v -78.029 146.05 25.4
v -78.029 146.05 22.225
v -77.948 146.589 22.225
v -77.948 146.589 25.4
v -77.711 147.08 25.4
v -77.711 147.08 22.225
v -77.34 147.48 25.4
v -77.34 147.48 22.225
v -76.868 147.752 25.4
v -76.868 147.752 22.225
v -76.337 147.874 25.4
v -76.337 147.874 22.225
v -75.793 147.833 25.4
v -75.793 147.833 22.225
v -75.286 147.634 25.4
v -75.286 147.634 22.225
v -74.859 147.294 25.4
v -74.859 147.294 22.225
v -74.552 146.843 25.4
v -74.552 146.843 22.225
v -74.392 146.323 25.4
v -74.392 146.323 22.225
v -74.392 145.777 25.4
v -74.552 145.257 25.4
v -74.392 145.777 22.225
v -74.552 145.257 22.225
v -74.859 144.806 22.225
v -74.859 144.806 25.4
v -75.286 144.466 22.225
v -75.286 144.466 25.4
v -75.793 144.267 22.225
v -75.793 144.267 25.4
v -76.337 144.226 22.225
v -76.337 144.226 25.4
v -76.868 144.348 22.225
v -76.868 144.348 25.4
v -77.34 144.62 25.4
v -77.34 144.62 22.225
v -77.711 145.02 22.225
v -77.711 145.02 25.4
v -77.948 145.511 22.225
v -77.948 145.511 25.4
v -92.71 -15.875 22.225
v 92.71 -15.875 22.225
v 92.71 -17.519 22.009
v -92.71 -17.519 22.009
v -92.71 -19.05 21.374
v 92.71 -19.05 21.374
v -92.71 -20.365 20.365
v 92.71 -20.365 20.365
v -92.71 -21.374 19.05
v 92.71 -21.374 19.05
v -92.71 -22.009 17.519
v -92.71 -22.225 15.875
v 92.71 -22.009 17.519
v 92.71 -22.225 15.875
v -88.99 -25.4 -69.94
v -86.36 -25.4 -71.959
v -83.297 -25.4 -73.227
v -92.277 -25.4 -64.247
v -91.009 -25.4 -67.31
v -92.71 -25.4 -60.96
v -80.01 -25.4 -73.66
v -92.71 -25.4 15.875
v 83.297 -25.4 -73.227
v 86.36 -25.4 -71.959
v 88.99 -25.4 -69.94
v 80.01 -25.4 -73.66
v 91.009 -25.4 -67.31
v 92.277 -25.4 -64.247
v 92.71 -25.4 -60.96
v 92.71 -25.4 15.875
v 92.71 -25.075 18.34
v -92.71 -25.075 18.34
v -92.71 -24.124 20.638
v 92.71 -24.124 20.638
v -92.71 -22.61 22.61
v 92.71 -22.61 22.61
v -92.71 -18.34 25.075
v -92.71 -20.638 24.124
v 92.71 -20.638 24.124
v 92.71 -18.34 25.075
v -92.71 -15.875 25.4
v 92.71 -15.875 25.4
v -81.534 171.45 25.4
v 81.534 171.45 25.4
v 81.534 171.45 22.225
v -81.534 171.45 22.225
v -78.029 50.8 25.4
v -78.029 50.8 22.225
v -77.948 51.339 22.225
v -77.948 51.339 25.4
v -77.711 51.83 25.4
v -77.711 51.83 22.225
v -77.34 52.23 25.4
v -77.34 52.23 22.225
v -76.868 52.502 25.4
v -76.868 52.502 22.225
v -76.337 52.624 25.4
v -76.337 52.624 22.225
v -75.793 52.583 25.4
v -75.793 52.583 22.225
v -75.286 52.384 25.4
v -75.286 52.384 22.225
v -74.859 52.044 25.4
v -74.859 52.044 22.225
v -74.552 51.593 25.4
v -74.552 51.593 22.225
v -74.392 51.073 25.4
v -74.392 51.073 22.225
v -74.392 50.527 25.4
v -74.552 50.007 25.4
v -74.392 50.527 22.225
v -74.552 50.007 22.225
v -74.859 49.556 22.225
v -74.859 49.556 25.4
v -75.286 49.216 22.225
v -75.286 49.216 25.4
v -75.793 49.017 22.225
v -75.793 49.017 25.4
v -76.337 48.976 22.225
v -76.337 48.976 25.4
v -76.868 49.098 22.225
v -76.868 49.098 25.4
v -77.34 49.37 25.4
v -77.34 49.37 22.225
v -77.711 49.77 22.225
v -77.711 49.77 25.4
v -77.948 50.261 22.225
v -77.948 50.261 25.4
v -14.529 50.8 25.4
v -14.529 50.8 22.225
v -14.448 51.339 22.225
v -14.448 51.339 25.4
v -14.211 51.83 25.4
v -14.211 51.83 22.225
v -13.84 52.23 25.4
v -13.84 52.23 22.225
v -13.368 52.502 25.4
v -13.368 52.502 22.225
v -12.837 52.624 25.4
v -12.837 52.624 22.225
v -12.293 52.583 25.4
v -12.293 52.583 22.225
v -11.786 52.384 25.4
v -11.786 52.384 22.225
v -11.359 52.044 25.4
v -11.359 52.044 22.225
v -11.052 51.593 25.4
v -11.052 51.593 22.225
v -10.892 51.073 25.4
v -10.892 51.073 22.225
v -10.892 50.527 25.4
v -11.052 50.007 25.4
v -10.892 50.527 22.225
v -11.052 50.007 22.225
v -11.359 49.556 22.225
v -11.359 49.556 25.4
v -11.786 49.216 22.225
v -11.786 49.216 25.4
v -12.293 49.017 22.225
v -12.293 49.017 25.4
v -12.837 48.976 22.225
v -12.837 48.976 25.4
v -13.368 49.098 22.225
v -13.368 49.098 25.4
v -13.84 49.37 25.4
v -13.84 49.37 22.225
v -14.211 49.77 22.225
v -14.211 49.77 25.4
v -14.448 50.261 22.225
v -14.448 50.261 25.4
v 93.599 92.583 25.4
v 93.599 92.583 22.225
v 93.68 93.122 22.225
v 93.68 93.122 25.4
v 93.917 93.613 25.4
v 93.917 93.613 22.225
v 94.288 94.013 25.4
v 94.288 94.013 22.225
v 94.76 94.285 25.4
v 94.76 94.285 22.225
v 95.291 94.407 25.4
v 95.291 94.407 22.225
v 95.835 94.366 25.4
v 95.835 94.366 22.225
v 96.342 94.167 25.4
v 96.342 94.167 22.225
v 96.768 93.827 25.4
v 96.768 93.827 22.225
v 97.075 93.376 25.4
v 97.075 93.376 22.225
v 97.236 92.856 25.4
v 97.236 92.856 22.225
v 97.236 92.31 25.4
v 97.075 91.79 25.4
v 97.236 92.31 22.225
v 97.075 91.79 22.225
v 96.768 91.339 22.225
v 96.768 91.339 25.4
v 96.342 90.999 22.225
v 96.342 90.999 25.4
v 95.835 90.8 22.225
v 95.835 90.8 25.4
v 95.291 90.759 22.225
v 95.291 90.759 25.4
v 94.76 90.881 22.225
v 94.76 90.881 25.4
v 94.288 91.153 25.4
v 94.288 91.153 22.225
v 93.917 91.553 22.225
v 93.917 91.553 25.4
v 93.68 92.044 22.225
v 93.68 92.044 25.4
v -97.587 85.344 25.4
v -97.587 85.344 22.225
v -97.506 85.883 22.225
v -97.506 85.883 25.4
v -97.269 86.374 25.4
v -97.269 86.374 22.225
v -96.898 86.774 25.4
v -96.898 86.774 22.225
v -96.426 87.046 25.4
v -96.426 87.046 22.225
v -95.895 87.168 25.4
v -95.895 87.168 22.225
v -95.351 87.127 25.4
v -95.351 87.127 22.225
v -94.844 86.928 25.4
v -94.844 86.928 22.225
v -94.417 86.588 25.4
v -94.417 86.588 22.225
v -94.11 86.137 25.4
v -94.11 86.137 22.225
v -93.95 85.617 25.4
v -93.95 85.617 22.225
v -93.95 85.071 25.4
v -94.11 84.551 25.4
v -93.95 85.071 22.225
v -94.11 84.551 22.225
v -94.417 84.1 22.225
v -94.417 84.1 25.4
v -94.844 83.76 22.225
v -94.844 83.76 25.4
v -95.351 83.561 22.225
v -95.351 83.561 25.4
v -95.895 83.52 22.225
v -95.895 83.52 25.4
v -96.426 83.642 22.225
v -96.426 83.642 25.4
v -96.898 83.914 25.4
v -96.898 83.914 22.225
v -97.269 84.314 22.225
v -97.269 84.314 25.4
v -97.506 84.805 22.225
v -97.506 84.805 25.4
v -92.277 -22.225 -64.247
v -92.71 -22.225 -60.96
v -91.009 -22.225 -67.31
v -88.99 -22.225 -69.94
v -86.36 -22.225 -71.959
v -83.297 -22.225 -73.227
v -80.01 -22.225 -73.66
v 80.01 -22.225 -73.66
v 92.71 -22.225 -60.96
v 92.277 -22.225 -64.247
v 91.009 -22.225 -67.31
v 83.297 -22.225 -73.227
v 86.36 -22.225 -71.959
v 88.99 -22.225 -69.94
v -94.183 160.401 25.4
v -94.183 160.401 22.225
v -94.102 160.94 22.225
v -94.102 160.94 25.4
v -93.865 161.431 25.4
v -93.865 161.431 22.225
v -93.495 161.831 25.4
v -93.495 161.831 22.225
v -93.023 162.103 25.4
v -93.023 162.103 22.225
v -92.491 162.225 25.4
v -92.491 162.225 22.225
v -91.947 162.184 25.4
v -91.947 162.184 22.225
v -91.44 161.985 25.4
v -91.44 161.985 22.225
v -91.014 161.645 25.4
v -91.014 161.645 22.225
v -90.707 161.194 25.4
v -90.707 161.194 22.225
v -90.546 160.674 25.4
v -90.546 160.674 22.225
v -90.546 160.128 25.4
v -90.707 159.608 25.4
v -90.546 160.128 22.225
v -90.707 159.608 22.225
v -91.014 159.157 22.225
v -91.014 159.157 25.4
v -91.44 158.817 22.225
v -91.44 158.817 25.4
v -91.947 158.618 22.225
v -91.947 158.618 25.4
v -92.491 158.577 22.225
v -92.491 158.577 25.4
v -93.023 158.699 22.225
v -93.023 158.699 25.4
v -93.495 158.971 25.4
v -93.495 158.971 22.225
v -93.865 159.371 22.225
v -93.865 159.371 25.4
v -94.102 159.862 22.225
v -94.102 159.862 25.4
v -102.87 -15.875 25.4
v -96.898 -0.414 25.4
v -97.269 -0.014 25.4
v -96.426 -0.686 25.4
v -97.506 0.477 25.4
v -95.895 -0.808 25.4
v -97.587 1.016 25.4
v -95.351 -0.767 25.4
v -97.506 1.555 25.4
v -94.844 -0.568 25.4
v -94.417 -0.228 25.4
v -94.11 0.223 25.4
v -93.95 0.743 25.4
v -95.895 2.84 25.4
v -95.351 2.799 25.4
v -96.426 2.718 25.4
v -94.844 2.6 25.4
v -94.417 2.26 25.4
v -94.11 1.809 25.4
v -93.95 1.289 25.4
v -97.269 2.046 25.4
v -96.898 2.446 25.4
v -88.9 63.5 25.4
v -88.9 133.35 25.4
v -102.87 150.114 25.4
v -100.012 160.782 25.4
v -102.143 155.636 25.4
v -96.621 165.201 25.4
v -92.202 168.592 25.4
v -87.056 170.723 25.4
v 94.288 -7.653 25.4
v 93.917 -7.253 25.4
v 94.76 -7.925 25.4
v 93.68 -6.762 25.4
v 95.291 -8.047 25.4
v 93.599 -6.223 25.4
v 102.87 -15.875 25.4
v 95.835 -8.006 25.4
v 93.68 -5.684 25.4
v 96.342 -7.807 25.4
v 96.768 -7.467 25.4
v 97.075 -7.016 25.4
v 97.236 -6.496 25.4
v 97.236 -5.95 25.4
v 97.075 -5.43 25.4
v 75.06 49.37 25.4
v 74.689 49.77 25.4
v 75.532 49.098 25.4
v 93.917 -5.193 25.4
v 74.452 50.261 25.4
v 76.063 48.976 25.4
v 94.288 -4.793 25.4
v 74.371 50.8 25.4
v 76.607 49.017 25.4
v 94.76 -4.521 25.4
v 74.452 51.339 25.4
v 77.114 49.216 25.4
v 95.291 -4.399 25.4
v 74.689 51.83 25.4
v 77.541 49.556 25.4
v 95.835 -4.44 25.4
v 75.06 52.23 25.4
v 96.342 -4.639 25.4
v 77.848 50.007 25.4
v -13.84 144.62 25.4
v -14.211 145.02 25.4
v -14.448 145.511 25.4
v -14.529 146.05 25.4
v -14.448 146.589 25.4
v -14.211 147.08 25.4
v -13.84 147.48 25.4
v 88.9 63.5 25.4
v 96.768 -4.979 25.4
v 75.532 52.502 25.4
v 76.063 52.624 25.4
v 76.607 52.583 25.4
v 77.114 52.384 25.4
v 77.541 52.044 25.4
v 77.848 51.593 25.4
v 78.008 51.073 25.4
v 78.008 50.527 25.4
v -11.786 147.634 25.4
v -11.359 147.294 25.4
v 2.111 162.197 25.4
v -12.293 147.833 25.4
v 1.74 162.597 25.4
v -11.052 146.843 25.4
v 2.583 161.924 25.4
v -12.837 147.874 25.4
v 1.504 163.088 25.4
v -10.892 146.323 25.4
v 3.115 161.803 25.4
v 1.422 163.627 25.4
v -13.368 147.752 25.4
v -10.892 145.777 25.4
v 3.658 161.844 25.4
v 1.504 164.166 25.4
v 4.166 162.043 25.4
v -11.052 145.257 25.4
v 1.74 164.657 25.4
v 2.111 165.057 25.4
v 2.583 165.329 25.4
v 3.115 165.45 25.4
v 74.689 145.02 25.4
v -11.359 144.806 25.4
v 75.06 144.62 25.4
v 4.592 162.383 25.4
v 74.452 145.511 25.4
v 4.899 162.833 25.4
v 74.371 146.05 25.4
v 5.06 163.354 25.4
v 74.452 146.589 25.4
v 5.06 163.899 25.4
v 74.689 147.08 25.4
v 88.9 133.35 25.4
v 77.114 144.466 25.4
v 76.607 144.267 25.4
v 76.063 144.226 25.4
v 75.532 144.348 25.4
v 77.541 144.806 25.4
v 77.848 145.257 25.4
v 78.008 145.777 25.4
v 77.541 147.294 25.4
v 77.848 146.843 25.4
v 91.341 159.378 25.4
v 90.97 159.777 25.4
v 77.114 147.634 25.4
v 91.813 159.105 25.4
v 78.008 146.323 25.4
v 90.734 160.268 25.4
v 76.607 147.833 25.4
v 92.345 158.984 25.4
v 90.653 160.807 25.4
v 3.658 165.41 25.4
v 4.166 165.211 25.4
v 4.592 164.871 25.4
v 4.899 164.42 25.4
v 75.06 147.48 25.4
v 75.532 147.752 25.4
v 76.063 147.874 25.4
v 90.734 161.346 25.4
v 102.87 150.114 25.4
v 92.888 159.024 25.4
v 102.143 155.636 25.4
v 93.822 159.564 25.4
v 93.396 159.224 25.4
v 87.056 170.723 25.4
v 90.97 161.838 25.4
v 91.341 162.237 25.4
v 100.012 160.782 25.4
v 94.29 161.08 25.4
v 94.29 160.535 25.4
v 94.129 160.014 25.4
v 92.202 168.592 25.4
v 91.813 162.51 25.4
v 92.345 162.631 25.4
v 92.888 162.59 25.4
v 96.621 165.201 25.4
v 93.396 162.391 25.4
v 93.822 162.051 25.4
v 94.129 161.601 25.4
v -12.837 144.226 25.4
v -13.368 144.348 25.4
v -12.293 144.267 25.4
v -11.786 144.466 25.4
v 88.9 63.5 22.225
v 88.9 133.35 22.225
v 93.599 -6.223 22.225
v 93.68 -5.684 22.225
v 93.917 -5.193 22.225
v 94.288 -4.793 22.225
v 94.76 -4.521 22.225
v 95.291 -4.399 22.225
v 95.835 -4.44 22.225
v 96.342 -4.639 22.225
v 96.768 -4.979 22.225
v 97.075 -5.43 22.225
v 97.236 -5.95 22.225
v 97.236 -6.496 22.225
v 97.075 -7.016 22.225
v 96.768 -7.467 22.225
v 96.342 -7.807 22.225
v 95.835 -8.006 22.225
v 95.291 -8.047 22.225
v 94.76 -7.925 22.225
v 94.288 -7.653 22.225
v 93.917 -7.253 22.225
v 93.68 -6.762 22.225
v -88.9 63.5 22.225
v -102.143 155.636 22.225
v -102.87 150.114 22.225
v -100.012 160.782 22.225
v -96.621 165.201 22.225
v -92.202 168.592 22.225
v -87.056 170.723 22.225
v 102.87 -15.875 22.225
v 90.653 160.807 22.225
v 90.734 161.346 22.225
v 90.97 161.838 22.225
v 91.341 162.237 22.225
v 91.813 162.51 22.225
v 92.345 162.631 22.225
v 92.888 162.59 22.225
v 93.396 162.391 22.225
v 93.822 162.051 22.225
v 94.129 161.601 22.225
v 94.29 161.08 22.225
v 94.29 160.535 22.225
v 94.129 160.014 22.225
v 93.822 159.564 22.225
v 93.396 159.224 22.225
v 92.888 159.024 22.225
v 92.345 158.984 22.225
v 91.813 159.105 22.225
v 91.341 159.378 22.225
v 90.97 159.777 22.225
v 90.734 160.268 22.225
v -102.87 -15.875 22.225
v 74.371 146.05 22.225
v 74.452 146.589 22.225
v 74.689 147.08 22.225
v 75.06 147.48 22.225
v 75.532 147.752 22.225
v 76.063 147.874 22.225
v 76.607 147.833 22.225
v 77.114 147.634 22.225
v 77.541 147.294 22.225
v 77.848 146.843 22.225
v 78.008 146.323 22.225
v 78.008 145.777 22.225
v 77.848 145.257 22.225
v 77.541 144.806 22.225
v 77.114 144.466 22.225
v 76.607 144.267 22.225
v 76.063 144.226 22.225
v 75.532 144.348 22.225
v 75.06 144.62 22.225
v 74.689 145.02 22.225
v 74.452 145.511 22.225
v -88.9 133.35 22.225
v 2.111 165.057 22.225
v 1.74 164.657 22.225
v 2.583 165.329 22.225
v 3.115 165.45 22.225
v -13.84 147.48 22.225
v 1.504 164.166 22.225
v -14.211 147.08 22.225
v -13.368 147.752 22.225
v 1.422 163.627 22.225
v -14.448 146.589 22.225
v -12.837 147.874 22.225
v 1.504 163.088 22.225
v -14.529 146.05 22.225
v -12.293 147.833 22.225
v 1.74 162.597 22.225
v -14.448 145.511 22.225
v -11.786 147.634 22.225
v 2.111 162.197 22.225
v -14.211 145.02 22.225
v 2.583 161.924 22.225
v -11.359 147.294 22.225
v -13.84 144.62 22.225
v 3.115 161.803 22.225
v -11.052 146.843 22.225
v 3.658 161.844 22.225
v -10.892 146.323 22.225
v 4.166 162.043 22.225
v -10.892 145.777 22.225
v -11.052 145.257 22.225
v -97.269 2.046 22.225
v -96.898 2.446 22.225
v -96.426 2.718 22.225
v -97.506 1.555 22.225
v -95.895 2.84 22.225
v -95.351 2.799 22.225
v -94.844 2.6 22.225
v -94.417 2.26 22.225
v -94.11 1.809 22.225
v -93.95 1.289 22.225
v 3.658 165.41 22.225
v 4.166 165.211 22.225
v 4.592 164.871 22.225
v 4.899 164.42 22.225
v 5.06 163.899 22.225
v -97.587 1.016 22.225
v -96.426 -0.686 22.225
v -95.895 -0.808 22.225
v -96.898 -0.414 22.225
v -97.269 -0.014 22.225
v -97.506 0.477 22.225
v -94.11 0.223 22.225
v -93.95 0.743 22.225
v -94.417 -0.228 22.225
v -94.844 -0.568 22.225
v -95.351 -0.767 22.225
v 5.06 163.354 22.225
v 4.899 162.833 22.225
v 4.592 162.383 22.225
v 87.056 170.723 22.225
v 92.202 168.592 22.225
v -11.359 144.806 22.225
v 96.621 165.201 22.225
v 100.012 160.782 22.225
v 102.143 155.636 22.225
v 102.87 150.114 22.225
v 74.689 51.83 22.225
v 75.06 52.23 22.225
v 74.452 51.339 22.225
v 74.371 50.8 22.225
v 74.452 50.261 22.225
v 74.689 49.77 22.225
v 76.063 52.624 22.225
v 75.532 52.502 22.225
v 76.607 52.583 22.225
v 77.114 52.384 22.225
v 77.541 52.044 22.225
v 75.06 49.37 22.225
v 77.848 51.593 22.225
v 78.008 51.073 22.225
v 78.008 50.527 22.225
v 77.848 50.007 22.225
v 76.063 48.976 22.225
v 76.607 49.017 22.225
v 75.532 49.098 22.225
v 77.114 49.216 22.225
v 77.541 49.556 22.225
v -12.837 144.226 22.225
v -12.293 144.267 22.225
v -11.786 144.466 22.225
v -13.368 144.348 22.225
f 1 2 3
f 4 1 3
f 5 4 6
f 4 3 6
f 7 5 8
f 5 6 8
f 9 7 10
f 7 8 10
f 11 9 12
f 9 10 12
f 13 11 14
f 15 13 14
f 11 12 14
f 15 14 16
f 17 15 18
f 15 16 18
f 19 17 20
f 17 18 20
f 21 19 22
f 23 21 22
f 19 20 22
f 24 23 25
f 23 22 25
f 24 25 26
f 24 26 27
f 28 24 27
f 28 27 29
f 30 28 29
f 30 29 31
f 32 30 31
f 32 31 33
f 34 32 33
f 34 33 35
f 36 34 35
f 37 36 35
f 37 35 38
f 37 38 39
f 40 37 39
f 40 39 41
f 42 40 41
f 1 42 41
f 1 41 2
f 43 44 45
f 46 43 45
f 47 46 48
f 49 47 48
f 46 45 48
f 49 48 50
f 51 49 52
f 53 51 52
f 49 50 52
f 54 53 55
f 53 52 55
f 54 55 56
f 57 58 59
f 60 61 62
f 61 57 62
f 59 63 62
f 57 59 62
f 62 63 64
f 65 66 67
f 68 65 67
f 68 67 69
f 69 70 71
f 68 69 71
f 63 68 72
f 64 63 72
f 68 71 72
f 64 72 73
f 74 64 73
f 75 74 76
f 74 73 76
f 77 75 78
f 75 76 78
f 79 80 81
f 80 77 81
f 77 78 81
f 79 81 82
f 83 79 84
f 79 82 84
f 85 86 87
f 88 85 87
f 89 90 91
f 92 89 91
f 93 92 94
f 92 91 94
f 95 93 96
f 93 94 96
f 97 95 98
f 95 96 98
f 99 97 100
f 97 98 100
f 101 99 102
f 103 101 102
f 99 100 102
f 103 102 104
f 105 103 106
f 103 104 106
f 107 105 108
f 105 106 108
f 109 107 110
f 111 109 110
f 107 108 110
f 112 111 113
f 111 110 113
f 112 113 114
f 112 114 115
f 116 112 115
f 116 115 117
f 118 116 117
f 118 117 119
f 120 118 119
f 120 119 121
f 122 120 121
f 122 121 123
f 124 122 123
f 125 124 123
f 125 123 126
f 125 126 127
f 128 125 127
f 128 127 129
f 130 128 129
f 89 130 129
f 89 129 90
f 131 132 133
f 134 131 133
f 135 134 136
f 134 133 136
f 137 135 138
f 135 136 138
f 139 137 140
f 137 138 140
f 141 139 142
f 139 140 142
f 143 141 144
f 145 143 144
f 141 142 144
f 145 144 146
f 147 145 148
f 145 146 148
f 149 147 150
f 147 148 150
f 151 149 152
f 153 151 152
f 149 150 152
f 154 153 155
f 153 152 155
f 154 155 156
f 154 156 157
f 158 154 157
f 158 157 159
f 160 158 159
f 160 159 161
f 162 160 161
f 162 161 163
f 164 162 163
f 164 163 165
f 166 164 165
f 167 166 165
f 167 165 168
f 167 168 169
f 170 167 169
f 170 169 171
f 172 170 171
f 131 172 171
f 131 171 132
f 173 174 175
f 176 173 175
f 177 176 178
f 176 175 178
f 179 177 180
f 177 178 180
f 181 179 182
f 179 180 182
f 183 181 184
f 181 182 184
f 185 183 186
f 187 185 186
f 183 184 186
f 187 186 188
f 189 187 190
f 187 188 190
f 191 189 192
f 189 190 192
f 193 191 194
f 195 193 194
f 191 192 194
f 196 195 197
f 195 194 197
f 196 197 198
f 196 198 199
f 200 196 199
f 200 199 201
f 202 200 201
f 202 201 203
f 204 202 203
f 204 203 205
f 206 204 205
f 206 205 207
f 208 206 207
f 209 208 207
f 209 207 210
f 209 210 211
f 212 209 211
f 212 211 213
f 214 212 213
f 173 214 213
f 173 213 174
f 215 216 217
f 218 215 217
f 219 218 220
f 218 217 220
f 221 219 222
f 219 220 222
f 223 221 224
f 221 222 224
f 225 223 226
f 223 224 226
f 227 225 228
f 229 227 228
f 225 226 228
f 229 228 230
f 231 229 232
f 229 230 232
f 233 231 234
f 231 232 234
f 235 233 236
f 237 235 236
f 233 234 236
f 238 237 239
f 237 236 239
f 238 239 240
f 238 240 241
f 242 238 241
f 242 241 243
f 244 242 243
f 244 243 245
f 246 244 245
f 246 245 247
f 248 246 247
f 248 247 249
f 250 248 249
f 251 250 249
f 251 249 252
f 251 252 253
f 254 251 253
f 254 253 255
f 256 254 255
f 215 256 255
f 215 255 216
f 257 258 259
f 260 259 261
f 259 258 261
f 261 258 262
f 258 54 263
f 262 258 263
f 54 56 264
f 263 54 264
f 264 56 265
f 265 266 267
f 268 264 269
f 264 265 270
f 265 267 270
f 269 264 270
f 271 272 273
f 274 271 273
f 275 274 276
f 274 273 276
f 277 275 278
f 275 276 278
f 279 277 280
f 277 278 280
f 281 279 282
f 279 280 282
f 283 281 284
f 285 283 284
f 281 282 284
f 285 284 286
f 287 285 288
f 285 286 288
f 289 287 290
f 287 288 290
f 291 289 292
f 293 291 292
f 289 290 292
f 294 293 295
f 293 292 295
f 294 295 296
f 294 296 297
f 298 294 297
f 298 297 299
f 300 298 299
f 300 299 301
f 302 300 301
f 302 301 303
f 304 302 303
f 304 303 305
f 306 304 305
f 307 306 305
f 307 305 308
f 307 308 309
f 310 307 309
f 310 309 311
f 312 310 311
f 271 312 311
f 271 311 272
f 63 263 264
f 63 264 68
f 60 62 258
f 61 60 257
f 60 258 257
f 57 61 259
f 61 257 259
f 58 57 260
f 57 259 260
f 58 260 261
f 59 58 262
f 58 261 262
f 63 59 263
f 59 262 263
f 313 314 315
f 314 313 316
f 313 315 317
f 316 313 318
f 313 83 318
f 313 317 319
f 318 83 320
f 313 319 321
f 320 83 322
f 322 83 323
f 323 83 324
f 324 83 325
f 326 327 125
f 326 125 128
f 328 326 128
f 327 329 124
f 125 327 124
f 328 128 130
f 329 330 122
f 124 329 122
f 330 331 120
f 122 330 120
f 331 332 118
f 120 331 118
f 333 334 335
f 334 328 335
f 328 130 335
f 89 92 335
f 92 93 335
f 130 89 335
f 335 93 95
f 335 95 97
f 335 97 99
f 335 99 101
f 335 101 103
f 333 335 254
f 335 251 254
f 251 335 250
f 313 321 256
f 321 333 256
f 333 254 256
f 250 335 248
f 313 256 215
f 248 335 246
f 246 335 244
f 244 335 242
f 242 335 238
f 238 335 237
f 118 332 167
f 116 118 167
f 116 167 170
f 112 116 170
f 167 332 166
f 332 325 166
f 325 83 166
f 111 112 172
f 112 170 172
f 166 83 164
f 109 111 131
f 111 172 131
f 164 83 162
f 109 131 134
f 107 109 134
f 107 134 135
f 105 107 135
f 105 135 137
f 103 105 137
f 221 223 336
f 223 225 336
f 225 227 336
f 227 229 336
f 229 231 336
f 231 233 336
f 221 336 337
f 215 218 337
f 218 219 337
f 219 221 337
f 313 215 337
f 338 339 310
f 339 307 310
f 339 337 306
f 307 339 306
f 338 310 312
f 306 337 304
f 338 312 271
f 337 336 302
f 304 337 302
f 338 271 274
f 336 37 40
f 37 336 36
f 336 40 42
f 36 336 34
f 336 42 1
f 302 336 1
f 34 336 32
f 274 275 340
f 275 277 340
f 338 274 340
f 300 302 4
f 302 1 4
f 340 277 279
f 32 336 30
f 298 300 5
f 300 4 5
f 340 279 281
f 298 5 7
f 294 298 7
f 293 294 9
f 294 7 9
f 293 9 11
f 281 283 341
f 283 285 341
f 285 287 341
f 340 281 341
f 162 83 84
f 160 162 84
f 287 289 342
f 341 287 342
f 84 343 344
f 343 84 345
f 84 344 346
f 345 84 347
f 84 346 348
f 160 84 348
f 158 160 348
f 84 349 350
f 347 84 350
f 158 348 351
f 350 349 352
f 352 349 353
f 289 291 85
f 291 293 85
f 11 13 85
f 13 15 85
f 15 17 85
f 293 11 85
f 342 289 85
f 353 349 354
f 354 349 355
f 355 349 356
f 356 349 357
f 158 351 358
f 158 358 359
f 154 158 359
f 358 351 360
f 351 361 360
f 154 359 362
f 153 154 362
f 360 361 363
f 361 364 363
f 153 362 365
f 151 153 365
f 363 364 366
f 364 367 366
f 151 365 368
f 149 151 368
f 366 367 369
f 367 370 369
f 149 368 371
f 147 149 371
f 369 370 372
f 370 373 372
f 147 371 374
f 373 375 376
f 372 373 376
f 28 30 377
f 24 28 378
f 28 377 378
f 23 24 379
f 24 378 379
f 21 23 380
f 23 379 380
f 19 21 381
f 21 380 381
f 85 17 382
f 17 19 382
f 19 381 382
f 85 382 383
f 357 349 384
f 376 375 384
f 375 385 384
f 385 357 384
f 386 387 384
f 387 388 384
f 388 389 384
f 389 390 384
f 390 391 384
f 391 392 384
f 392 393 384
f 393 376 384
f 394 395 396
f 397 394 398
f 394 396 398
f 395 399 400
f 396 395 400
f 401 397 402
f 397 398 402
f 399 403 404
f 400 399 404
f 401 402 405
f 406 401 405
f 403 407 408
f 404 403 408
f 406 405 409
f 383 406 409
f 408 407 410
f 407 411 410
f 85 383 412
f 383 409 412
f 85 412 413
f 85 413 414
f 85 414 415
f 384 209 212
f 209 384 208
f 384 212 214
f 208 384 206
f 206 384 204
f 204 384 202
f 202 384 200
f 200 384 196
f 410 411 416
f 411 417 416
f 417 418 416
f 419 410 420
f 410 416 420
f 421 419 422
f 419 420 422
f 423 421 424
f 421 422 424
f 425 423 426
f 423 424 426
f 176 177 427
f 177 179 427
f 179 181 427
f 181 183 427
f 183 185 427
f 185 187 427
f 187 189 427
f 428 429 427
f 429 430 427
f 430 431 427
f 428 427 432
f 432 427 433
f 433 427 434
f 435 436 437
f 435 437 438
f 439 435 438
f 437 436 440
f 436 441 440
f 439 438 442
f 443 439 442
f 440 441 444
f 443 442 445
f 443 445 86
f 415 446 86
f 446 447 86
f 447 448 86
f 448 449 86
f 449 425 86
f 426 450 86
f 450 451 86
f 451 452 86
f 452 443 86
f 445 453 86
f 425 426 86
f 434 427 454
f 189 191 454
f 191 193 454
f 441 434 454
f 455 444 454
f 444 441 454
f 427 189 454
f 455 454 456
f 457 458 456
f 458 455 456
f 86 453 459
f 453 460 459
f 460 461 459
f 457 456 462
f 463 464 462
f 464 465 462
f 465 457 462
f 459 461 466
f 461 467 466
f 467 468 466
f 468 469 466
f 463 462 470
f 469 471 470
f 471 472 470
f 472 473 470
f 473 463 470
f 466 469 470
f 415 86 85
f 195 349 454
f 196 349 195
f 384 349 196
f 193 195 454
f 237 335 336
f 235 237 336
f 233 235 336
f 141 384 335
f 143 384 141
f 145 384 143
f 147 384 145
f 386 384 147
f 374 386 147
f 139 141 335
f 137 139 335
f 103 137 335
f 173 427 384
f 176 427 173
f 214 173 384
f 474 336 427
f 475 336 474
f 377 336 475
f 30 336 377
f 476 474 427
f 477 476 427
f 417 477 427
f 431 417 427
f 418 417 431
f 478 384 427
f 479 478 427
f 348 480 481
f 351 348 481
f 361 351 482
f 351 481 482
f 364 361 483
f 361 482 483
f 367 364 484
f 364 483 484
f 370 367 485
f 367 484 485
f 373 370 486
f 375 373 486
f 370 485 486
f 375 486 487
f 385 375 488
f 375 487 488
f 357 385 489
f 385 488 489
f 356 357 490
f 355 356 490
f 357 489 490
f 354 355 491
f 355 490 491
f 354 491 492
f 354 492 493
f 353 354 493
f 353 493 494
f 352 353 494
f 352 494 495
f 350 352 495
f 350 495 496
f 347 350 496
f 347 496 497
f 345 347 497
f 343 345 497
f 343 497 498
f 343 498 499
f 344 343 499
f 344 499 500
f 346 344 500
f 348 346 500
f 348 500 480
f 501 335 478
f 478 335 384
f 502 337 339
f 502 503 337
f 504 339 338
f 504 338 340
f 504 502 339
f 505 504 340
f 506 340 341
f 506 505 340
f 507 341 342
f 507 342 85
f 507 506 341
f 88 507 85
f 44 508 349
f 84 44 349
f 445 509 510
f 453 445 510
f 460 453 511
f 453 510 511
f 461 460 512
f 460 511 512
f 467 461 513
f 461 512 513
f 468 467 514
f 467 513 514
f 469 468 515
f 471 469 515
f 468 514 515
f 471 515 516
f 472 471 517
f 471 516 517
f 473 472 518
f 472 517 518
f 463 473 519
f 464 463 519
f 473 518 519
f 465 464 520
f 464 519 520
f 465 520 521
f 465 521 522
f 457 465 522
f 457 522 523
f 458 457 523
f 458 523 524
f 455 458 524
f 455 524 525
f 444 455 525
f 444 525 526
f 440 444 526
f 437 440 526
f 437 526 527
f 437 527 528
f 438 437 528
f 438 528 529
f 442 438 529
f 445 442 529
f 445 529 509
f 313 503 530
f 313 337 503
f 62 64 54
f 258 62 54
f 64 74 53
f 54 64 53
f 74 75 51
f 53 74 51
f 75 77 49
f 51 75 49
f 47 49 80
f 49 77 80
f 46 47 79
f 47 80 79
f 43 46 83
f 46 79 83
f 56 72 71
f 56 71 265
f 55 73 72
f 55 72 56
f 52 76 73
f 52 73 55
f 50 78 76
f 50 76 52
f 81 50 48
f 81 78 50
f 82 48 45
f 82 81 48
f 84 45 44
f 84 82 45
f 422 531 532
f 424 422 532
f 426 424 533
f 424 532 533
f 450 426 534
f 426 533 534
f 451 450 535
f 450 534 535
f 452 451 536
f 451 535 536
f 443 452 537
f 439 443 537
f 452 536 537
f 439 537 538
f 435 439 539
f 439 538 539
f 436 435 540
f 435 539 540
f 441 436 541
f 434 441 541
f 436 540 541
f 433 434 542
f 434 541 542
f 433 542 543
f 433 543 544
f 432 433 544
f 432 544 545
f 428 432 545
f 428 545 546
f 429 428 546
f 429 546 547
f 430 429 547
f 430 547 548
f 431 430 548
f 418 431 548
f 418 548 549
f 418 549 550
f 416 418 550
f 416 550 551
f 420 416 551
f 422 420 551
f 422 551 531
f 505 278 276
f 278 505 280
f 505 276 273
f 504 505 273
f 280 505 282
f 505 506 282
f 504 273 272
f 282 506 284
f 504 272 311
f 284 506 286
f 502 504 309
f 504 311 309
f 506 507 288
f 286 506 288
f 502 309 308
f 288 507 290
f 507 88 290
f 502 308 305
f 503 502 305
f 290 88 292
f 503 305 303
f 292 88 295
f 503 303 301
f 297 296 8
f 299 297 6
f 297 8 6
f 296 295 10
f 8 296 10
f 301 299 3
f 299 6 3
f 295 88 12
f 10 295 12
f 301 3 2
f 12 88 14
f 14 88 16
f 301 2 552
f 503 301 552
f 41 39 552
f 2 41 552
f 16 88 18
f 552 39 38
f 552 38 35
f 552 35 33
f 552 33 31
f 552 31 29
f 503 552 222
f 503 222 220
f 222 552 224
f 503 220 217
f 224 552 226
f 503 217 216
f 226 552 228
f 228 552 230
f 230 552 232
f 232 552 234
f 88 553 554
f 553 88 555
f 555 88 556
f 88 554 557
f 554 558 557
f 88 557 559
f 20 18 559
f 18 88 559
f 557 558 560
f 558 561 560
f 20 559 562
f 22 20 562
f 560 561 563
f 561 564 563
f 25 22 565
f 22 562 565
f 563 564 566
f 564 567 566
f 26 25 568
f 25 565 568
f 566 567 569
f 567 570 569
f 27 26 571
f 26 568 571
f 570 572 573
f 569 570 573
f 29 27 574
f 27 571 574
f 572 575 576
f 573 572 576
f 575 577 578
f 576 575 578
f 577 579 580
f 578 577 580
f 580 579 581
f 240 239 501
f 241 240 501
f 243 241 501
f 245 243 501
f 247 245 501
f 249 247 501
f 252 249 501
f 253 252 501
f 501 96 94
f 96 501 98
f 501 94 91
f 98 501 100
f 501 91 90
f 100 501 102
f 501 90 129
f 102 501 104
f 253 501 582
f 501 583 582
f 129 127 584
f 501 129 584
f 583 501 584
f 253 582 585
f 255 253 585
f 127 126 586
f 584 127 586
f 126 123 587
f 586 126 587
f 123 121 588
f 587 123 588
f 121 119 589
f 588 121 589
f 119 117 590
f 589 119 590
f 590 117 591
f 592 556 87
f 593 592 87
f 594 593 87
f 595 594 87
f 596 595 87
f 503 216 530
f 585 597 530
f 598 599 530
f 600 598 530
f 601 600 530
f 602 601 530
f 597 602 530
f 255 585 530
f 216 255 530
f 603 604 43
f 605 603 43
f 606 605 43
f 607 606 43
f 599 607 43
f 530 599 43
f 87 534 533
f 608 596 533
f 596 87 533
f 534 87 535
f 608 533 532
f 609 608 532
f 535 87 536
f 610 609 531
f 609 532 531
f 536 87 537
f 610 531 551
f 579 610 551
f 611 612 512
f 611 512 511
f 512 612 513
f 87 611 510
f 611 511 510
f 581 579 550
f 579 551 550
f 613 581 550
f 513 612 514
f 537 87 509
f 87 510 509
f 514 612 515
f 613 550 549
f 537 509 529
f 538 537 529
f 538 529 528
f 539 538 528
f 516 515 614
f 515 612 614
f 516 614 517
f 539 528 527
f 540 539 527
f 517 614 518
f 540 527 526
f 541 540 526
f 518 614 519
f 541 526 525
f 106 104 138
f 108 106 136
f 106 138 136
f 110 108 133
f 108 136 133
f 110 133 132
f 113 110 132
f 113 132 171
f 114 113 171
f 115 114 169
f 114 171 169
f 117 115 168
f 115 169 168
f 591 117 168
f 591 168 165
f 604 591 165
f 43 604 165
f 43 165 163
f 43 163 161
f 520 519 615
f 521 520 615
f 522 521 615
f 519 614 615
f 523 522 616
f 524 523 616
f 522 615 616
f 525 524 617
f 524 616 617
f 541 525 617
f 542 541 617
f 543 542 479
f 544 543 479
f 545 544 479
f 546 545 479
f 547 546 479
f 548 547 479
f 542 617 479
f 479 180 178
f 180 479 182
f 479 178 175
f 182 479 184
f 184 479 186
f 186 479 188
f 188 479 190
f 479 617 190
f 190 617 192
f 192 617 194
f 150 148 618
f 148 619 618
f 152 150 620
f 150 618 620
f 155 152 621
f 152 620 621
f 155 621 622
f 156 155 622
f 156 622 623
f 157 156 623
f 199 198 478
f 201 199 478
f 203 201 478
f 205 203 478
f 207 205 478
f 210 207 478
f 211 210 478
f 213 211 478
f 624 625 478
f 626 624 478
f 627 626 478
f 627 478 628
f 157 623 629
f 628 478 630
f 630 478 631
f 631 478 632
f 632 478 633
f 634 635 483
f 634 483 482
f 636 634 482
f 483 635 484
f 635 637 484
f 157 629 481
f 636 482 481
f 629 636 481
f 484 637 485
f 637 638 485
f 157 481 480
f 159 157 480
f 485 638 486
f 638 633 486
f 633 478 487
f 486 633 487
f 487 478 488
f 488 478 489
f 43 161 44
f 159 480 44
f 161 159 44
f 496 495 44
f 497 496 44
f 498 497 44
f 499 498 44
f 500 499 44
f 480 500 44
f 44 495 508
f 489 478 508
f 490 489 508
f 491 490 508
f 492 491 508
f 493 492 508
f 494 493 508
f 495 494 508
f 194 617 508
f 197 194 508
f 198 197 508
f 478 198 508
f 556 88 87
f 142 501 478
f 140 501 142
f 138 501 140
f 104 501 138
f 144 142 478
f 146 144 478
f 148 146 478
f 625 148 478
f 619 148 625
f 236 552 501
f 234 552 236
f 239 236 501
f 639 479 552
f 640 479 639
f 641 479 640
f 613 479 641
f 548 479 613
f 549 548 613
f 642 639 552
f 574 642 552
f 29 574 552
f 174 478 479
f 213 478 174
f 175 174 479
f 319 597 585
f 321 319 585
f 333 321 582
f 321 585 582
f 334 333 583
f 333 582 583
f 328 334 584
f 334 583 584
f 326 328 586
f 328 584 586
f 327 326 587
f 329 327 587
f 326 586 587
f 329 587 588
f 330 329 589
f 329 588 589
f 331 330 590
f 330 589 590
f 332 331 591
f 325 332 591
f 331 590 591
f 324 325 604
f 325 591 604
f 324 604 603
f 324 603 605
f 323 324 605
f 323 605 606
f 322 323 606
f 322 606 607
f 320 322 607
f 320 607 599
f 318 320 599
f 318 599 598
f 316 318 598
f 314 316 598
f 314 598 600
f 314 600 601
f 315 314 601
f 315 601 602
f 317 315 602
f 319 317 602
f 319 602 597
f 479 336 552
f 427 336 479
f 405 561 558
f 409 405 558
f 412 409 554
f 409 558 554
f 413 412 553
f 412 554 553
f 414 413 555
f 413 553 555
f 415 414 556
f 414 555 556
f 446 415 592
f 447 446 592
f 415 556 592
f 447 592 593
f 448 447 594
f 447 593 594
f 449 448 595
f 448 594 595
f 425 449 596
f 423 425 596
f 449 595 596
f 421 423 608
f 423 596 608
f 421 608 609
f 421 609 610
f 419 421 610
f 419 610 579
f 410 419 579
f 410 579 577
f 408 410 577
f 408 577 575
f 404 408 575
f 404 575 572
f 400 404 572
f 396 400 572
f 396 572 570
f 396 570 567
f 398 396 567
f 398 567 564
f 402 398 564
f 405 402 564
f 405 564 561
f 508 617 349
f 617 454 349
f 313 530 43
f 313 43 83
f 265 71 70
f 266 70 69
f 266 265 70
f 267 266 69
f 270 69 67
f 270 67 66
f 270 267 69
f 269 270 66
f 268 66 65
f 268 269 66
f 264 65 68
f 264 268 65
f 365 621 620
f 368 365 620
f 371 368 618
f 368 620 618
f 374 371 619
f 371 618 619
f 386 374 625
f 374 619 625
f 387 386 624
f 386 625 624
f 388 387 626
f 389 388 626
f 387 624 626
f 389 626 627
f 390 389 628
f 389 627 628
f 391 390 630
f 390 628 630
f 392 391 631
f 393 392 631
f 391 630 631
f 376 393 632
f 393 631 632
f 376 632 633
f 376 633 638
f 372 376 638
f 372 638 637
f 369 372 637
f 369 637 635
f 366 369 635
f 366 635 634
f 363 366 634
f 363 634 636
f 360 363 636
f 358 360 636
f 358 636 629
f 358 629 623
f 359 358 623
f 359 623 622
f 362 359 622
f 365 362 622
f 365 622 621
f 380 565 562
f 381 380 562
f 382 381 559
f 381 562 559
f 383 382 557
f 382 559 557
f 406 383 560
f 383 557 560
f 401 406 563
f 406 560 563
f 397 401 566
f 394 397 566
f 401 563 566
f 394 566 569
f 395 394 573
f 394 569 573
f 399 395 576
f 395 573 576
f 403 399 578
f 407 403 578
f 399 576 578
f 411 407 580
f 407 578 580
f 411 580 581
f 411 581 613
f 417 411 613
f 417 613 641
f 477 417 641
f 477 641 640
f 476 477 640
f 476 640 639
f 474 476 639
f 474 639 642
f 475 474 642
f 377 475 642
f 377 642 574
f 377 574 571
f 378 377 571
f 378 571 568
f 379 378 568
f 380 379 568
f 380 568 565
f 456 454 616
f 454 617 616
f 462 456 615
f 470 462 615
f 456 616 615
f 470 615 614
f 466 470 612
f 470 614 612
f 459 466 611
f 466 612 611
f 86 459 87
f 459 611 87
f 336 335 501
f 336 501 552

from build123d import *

# Parameters (mm, degrees)
BASE_FLANGE1_DEPTH          = 102.87
SKETCH6_W                   = 9.525
SKETCH6_H                   = 99.06
CUT_EXTRUDE1_DEPTH          = 10.16
FILLET1_R                   = 21.336
FILLET2_R                   = 12.7
SKETCH8_W                   = 177.8
SKETCH8_H                   = 69.85
CUT_EXTRUDE2_DEPTH          = 10.16
F_27_0_144_DIAMETER_HOLE1_D = 3.6576
F_27_0_144_DIAMETER_HOLE2_D = 3.6576


# Sheet-metal steps are written as plain solids
with BuildPart() as part:
    # Sketch1 → Base-Flange1 (new, symmetric)
    with BuildSketch(Plane.YZ):
        with BuildLine():
            Line((-25.4, -73.66), (-25.4, 15.875))
            ThreePointArc((-25.4, 15.875), (-22.610192091, 22.610192091), (-15.875, 25.4))
            Line((-15.875, 25.4), (171.45, 25.4))
            Line((171.45, 25.4), (171.45, 22.225))
            Line((171.45, 22.225), (-15.875, 22.225))
            ThreePointArc((-15.875, 22.225), (-20.365128061, 20.365128061), (-22.225, 15.875))
            Line((-22.225, 15.875), (-22.225, -73.66))
            Line((-22.225, -73.66), (-25.4, -73.66))
        make_face()
    extrude(amount=BASE_FLANGE1_DEPTH, both=True)

    # Sketch6 → Cut-Extrude1 (cut)
    with BuildSketch(Plane.YZ.offset(102.87)):
        with Locations((-20.6375, -24.13)):
            Rectangle(SKETCH6_W, SKETCH6_H)
    cut_extrude1 = extrude(amount=-CUT_EXTRUDE1_DEPTH, mode=Mode.SUBTRACT)

    # Mirror1: Cut-Extrude1 across plane
    add(cut_extrude1.mirror(Plane(origin=(0, 0, 0), x_dir=(0, 0, 1), z_dir=(1, 0, 0))), mode=Mode.SUBTRACT)

    # Fillet1
    fillet1_edges = [part.edges().sort_by_distance(p)[0] for p in [
        (102.87, 171.45, 23.8125),
        (-102.87, 171.45, 23.8125),
    ]]
    fillet(fillet1_edges, radius=FILLET1_R)

    # Fillet2
    fillet2_edges = [part.edges().sort_by_distance(p)[0] for p in [
        (92.71, -23.8125, -73.66),
        (-92.71, -23.8125, -73.66),
    ]]
    fillet(fillet2_edges, radius=FILLET2_R)

    # Sketch8 → Cut-Extrude2 (cut)
    with BuildSketch(Plane.XY.offset(25.4)):
        with Locations((0, 98.425)):
            Rectangle(SKETCH8_W, SKETCH8_H)
    extrude(amount=-CUT_EXTRUDE2_DEPTH, mode=Mode.SUBTRACT)

    # #27 (0.144) Diameter Hole1 (through all)
    with Locations(Plane.XY.offset(25.4)):
        with Locations((-76.2, 146.05), (-12.7, 146.05), (76.2, 146.05), (76.2, 50.8), (-12.7, 50.8), (-76.2, 50.8)):
            Hole(F_27_0_144_DIAMETER_HOLE1_D / 2)

    # #27 (0.144) Diameter Hole2 (through all)
    with Locations(Plane.XY.offset(25.4)):
        with Locations((92.4814, 160.8074), (95.4278, 92.583), (95.4278, -6.223), (-95.758, 1.016), (-95.758, 85.344), (-92.3544, 160.401), (3.2512, 163.6268)):
            Hole(F_27_0_144_DIAMETER_HOLE2_D / 2)


solid = part.part
